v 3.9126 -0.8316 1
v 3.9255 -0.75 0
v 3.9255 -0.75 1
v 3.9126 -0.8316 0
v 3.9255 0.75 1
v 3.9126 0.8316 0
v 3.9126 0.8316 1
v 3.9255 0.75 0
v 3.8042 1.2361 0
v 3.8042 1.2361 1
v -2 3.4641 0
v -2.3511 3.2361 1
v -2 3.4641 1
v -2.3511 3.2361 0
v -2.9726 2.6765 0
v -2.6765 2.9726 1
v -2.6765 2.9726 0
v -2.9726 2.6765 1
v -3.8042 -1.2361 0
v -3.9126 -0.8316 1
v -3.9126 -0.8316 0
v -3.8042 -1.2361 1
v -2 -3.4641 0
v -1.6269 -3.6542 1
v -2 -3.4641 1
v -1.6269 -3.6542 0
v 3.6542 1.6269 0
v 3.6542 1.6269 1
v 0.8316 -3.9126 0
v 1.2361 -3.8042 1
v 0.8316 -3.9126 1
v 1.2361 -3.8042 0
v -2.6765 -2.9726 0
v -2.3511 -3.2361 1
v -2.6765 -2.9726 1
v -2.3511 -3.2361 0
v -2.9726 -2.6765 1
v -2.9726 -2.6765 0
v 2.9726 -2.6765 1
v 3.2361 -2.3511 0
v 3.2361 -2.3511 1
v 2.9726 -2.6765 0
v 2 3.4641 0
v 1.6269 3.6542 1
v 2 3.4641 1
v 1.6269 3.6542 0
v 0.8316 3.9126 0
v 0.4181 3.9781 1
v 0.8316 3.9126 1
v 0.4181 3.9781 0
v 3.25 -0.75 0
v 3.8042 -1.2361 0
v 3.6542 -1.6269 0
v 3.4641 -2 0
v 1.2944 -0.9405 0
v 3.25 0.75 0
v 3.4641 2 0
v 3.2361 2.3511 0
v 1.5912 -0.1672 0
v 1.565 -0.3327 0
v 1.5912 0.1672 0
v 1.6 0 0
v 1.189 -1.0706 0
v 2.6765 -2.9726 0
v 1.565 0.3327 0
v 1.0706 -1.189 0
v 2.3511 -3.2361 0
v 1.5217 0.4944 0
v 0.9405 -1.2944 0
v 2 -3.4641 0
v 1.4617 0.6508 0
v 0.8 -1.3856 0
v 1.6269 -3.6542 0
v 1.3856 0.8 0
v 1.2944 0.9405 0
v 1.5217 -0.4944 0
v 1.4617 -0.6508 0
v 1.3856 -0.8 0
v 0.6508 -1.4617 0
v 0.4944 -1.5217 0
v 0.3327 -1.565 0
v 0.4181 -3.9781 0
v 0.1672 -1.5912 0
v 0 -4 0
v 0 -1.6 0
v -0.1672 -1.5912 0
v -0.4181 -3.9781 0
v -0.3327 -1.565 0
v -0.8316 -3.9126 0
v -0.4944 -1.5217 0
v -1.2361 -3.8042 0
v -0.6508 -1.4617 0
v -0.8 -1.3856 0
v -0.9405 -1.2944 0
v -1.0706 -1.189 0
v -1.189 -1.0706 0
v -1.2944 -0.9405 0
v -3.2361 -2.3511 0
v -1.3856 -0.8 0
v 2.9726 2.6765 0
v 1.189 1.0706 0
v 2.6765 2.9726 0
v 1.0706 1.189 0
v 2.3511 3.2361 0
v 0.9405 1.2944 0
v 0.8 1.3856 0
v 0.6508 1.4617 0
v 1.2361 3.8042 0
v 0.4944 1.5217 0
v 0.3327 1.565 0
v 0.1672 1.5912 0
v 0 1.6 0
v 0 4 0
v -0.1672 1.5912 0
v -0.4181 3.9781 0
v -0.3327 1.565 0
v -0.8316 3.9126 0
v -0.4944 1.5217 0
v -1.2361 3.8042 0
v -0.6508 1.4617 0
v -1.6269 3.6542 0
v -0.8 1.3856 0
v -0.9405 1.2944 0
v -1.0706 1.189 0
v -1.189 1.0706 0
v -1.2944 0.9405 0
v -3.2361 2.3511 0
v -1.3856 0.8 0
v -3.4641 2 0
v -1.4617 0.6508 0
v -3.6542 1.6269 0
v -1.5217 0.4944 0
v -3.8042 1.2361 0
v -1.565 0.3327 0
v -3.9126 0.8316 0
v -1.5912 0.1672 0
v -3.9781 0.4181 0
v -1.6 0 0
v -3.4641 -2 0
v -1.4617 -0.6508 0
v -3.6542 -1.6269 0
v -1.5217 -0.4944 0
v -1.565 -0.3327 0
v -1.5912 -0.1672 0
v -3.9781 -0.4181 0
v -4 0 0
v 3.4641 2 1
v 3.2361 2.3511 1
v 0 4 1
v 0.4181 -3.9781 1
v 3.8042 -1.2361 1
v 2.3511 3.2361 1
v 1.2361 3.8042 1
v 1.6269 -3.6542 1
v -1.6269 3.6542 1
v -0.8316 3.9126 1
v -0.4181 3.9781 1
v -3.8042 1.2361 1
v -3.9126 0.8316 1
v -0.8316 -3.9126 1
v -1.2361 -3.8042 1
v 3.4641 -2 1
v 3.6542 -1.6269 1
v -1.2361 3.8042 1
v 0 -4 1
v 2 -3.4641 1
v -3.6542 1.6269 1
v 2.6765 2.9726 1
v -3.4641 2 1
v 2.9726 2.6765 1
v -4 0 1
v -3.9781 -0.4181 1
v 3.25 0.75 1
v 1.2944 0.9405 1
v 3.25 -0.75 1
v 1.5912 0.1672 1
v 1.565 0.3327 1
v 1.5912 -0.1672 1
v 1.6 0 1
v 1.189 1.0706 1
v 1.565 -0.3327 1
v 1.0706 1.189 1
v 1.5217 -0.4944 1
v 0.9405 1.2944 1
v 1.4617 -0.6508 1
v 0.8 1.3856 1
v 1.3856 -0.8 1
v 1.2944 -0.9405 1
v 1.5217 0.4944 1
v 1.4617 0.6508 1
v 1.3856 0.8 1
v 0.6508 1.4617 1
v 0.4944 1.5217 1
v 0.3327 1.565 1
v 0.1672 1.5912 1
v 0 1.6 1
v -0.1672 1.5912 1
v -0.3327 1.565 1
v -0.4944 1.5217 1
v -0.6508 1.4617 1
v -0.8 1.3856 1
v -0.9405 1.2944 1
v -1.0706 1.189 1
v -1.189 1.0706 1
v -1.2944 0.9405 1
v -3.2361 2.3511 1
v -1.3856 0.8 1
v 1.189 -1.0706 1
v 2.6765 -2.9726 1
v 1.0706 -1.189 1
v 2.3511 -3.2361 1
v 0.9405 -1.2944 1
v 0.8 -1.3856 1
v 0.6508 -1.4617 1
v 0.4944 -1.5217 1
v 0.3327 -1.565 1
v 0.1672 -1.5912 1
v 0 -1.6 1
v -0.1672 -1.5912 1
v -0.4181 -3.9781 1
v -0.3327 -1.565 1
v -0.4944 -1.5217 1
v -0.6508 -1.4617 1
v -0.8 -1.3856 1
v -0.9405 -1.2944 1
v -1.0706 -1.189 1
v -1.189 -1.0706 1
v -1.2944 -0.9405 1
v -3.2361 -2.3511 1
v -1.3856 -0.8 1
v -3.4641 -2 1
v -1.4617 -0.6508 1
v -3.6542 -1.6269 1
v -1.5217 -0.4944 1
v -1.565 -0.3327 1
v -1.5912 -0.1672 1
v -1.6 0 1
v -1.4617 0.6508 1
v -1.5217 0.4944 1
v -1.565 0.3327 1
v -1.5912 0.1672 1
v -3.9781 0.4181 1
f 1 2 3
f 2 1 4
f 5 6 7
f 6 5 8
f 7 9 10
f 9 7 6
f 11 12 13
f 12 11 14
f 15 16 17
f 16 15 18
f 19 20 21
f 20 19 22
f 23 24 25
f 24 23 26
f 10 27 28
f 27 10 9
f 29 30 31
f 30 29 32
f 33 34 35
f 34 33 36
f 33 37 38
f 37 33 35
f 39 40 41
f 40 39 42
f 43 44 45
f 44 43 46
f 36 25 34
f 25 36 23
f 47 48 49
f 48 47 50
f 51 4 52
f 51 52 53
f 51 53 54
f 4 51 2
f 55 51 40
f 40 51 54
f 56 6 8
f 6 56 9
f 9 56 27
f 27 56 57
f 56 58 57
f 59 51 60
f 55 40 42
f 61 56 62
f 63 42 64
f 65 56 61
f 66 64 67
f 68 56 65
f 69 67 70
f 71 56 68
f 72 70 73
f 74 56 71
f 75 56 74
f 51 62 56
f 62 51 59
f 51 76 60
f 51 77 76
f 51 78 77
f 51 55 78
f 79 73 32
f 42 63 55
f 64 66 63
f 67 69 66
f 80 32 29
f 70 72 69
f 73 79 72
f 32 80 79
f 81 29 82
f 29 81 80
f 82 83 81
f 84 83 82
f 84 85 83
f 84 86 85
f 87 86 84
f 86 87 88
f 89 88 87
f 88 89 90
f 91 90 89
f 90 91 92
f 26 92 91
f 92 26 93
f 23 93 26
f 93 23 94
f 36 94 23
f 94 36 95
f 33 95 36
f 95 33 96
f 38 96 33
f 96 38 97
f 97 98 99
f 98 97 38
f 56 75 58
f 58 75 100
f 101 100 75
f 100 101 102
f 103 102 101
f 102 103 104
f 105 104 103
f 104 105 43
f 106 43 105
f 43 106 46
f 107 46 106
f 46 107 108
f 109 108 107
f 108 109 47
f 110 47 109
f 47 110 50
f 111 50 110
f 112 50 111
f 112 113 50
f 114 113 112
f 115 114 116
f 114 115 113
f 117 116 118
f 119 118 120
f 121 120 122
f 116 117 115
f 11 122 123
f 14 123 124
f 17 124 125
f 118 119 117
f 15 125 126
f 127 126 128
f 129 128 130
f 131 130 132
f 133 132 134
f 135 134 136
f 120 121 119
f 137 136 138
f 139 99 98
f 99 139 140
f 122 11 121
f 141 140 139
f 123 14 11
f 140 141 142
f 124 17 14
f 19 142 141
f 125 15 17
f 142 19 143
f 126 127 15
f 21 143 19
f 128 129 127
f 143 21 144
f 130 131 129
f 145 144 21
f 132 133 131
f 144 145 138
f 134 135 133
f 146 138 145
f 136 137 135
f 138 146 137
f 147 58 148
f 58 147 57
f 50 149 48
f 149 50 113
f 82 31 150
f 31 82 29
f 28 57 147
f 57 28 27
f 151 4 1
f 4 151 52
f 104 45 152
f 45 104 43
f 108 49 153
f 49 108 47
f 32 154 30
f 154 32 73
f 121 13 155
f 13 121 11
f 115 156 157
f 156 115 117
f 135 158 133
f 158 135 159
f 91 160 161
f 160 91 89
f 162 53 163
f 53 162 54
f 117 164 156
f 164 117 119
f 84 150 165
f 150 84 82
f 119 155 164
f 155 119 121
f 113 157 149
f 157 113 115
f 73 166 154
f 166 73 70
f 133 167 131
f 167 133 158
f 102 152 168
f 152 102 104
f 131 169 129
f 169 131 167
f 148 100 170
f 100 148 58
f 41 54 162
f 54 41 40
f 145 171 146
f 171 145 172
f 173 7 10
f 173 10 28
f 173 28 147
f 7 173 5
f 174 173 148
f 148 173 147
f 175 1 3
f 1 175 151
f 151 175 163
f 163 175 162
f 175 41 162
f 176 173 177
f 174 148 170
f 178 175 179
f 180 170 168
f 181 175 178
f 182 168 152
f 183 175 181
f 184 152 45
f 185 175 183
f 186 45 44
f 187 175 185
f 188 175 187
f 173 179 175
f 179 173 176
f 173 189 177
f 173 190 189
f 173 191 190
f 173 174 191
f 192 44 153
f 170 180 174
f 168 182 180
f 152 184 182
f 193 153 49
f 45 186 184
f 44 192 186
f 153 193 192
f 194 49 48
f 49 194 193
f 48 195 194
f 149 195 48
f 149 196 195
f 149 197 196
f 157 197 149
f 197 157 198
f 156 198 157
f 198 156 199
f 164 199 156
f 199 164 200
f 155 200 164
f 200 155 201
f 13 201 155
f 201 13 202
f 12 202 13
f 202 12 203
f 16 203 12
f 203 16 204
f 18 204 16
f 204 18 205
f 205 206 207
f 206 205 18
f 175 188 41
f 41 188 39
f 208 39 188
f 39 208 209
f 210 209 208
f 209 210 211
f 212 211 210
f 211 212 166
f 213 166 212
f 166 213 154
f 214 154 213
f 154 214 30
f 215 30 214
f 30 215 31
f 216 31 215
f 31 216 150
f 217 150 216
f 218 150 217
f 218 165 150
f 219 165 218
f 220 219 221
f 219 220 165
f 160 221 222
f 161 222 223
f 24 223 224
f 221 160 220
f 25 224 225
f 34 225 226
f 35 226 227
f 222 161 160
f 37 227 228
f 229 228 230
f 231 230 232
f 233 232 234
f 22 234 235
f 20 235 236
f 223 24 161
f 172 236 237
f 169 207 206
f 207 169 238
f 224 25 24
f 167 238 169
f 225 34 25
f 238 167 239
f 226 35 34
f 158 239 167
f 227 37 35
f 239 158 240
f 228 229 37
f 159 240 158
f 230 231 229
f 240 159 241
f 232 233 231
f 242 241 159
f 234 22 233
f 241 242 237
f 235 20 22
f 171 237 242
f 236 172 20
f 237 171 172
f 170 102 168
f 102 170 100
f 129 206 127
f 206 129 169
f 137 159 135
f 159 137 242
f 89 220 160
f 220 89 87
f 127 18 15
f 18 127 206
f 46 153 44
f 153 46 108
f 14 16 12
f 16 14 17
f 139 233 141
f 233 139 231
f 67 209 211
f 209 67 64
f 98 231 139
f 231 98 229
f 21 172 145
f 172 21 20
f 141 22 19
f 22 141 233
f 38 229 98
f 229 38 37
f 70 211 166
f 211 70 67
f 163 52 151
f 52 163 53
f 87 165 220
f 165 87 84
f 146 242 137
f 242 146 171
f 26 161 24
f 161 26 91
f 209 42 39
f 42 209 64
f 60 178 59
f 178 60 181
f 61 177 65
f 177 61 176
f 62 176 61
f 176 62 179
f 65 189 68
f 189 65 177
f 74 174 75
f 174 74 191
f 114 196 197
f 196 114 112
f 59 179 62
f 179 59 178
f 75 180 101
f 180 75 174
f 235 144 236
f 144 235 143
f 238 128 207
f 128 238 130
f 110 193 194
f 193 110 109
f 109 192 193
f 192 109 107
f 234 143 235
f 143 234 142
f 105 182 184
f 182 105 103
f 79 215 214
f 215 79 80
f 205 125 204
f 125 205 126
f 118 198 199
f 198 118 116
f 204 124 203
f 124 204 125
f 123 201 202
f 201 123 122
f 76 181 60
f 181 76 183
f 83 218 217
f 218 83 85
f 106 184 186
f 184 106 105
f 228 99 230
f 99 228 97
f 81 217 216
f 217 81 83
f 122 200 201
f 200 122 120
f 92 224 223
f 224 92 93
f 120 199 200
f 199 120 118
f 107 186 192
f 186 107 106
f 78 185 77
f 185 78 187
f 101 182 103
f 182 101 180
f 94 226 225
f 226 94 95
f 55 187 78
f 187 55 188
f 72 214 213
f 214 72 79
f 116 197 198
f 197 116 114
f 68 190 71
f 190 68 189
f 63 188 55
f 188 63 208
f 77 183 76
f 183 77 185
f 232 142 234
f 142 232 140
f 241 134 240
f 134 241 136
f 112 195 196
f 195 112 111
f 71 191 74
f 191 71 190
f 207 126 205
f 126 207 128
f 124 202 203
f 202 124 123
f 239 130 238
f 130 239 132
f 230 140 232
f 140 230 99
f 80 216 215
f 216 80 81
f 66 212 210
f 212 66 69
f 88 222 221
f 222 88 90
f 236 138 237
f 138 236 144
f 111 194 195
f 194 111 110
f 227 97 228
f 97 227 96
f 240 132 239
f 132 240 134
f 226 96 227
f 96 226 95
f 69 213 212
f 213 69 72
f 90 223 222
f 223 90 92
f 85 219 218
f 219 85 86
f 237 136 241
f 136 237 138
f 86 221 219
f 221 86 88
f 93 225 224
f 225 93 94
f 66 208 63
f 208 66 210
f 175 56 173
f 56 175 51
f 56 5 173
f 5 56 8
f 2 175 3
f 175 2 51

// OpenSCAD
// Split lock washer.
$fn = 60;
eps = 0.02;
inner_d = 3.2;
outer_d = 8;
thickness = 1;
gap = 1.5;
difference() {
    cylinder(d=outer_d,h=thickness);
    translate([0,0,-eps]) cylinder(d=inner_d,h=thickness+2*eps);
    translate([outer_d/2-gap/2,-gap/2,-eps]) cube([gap+eps,gap,thickness+2*eps]);
}
